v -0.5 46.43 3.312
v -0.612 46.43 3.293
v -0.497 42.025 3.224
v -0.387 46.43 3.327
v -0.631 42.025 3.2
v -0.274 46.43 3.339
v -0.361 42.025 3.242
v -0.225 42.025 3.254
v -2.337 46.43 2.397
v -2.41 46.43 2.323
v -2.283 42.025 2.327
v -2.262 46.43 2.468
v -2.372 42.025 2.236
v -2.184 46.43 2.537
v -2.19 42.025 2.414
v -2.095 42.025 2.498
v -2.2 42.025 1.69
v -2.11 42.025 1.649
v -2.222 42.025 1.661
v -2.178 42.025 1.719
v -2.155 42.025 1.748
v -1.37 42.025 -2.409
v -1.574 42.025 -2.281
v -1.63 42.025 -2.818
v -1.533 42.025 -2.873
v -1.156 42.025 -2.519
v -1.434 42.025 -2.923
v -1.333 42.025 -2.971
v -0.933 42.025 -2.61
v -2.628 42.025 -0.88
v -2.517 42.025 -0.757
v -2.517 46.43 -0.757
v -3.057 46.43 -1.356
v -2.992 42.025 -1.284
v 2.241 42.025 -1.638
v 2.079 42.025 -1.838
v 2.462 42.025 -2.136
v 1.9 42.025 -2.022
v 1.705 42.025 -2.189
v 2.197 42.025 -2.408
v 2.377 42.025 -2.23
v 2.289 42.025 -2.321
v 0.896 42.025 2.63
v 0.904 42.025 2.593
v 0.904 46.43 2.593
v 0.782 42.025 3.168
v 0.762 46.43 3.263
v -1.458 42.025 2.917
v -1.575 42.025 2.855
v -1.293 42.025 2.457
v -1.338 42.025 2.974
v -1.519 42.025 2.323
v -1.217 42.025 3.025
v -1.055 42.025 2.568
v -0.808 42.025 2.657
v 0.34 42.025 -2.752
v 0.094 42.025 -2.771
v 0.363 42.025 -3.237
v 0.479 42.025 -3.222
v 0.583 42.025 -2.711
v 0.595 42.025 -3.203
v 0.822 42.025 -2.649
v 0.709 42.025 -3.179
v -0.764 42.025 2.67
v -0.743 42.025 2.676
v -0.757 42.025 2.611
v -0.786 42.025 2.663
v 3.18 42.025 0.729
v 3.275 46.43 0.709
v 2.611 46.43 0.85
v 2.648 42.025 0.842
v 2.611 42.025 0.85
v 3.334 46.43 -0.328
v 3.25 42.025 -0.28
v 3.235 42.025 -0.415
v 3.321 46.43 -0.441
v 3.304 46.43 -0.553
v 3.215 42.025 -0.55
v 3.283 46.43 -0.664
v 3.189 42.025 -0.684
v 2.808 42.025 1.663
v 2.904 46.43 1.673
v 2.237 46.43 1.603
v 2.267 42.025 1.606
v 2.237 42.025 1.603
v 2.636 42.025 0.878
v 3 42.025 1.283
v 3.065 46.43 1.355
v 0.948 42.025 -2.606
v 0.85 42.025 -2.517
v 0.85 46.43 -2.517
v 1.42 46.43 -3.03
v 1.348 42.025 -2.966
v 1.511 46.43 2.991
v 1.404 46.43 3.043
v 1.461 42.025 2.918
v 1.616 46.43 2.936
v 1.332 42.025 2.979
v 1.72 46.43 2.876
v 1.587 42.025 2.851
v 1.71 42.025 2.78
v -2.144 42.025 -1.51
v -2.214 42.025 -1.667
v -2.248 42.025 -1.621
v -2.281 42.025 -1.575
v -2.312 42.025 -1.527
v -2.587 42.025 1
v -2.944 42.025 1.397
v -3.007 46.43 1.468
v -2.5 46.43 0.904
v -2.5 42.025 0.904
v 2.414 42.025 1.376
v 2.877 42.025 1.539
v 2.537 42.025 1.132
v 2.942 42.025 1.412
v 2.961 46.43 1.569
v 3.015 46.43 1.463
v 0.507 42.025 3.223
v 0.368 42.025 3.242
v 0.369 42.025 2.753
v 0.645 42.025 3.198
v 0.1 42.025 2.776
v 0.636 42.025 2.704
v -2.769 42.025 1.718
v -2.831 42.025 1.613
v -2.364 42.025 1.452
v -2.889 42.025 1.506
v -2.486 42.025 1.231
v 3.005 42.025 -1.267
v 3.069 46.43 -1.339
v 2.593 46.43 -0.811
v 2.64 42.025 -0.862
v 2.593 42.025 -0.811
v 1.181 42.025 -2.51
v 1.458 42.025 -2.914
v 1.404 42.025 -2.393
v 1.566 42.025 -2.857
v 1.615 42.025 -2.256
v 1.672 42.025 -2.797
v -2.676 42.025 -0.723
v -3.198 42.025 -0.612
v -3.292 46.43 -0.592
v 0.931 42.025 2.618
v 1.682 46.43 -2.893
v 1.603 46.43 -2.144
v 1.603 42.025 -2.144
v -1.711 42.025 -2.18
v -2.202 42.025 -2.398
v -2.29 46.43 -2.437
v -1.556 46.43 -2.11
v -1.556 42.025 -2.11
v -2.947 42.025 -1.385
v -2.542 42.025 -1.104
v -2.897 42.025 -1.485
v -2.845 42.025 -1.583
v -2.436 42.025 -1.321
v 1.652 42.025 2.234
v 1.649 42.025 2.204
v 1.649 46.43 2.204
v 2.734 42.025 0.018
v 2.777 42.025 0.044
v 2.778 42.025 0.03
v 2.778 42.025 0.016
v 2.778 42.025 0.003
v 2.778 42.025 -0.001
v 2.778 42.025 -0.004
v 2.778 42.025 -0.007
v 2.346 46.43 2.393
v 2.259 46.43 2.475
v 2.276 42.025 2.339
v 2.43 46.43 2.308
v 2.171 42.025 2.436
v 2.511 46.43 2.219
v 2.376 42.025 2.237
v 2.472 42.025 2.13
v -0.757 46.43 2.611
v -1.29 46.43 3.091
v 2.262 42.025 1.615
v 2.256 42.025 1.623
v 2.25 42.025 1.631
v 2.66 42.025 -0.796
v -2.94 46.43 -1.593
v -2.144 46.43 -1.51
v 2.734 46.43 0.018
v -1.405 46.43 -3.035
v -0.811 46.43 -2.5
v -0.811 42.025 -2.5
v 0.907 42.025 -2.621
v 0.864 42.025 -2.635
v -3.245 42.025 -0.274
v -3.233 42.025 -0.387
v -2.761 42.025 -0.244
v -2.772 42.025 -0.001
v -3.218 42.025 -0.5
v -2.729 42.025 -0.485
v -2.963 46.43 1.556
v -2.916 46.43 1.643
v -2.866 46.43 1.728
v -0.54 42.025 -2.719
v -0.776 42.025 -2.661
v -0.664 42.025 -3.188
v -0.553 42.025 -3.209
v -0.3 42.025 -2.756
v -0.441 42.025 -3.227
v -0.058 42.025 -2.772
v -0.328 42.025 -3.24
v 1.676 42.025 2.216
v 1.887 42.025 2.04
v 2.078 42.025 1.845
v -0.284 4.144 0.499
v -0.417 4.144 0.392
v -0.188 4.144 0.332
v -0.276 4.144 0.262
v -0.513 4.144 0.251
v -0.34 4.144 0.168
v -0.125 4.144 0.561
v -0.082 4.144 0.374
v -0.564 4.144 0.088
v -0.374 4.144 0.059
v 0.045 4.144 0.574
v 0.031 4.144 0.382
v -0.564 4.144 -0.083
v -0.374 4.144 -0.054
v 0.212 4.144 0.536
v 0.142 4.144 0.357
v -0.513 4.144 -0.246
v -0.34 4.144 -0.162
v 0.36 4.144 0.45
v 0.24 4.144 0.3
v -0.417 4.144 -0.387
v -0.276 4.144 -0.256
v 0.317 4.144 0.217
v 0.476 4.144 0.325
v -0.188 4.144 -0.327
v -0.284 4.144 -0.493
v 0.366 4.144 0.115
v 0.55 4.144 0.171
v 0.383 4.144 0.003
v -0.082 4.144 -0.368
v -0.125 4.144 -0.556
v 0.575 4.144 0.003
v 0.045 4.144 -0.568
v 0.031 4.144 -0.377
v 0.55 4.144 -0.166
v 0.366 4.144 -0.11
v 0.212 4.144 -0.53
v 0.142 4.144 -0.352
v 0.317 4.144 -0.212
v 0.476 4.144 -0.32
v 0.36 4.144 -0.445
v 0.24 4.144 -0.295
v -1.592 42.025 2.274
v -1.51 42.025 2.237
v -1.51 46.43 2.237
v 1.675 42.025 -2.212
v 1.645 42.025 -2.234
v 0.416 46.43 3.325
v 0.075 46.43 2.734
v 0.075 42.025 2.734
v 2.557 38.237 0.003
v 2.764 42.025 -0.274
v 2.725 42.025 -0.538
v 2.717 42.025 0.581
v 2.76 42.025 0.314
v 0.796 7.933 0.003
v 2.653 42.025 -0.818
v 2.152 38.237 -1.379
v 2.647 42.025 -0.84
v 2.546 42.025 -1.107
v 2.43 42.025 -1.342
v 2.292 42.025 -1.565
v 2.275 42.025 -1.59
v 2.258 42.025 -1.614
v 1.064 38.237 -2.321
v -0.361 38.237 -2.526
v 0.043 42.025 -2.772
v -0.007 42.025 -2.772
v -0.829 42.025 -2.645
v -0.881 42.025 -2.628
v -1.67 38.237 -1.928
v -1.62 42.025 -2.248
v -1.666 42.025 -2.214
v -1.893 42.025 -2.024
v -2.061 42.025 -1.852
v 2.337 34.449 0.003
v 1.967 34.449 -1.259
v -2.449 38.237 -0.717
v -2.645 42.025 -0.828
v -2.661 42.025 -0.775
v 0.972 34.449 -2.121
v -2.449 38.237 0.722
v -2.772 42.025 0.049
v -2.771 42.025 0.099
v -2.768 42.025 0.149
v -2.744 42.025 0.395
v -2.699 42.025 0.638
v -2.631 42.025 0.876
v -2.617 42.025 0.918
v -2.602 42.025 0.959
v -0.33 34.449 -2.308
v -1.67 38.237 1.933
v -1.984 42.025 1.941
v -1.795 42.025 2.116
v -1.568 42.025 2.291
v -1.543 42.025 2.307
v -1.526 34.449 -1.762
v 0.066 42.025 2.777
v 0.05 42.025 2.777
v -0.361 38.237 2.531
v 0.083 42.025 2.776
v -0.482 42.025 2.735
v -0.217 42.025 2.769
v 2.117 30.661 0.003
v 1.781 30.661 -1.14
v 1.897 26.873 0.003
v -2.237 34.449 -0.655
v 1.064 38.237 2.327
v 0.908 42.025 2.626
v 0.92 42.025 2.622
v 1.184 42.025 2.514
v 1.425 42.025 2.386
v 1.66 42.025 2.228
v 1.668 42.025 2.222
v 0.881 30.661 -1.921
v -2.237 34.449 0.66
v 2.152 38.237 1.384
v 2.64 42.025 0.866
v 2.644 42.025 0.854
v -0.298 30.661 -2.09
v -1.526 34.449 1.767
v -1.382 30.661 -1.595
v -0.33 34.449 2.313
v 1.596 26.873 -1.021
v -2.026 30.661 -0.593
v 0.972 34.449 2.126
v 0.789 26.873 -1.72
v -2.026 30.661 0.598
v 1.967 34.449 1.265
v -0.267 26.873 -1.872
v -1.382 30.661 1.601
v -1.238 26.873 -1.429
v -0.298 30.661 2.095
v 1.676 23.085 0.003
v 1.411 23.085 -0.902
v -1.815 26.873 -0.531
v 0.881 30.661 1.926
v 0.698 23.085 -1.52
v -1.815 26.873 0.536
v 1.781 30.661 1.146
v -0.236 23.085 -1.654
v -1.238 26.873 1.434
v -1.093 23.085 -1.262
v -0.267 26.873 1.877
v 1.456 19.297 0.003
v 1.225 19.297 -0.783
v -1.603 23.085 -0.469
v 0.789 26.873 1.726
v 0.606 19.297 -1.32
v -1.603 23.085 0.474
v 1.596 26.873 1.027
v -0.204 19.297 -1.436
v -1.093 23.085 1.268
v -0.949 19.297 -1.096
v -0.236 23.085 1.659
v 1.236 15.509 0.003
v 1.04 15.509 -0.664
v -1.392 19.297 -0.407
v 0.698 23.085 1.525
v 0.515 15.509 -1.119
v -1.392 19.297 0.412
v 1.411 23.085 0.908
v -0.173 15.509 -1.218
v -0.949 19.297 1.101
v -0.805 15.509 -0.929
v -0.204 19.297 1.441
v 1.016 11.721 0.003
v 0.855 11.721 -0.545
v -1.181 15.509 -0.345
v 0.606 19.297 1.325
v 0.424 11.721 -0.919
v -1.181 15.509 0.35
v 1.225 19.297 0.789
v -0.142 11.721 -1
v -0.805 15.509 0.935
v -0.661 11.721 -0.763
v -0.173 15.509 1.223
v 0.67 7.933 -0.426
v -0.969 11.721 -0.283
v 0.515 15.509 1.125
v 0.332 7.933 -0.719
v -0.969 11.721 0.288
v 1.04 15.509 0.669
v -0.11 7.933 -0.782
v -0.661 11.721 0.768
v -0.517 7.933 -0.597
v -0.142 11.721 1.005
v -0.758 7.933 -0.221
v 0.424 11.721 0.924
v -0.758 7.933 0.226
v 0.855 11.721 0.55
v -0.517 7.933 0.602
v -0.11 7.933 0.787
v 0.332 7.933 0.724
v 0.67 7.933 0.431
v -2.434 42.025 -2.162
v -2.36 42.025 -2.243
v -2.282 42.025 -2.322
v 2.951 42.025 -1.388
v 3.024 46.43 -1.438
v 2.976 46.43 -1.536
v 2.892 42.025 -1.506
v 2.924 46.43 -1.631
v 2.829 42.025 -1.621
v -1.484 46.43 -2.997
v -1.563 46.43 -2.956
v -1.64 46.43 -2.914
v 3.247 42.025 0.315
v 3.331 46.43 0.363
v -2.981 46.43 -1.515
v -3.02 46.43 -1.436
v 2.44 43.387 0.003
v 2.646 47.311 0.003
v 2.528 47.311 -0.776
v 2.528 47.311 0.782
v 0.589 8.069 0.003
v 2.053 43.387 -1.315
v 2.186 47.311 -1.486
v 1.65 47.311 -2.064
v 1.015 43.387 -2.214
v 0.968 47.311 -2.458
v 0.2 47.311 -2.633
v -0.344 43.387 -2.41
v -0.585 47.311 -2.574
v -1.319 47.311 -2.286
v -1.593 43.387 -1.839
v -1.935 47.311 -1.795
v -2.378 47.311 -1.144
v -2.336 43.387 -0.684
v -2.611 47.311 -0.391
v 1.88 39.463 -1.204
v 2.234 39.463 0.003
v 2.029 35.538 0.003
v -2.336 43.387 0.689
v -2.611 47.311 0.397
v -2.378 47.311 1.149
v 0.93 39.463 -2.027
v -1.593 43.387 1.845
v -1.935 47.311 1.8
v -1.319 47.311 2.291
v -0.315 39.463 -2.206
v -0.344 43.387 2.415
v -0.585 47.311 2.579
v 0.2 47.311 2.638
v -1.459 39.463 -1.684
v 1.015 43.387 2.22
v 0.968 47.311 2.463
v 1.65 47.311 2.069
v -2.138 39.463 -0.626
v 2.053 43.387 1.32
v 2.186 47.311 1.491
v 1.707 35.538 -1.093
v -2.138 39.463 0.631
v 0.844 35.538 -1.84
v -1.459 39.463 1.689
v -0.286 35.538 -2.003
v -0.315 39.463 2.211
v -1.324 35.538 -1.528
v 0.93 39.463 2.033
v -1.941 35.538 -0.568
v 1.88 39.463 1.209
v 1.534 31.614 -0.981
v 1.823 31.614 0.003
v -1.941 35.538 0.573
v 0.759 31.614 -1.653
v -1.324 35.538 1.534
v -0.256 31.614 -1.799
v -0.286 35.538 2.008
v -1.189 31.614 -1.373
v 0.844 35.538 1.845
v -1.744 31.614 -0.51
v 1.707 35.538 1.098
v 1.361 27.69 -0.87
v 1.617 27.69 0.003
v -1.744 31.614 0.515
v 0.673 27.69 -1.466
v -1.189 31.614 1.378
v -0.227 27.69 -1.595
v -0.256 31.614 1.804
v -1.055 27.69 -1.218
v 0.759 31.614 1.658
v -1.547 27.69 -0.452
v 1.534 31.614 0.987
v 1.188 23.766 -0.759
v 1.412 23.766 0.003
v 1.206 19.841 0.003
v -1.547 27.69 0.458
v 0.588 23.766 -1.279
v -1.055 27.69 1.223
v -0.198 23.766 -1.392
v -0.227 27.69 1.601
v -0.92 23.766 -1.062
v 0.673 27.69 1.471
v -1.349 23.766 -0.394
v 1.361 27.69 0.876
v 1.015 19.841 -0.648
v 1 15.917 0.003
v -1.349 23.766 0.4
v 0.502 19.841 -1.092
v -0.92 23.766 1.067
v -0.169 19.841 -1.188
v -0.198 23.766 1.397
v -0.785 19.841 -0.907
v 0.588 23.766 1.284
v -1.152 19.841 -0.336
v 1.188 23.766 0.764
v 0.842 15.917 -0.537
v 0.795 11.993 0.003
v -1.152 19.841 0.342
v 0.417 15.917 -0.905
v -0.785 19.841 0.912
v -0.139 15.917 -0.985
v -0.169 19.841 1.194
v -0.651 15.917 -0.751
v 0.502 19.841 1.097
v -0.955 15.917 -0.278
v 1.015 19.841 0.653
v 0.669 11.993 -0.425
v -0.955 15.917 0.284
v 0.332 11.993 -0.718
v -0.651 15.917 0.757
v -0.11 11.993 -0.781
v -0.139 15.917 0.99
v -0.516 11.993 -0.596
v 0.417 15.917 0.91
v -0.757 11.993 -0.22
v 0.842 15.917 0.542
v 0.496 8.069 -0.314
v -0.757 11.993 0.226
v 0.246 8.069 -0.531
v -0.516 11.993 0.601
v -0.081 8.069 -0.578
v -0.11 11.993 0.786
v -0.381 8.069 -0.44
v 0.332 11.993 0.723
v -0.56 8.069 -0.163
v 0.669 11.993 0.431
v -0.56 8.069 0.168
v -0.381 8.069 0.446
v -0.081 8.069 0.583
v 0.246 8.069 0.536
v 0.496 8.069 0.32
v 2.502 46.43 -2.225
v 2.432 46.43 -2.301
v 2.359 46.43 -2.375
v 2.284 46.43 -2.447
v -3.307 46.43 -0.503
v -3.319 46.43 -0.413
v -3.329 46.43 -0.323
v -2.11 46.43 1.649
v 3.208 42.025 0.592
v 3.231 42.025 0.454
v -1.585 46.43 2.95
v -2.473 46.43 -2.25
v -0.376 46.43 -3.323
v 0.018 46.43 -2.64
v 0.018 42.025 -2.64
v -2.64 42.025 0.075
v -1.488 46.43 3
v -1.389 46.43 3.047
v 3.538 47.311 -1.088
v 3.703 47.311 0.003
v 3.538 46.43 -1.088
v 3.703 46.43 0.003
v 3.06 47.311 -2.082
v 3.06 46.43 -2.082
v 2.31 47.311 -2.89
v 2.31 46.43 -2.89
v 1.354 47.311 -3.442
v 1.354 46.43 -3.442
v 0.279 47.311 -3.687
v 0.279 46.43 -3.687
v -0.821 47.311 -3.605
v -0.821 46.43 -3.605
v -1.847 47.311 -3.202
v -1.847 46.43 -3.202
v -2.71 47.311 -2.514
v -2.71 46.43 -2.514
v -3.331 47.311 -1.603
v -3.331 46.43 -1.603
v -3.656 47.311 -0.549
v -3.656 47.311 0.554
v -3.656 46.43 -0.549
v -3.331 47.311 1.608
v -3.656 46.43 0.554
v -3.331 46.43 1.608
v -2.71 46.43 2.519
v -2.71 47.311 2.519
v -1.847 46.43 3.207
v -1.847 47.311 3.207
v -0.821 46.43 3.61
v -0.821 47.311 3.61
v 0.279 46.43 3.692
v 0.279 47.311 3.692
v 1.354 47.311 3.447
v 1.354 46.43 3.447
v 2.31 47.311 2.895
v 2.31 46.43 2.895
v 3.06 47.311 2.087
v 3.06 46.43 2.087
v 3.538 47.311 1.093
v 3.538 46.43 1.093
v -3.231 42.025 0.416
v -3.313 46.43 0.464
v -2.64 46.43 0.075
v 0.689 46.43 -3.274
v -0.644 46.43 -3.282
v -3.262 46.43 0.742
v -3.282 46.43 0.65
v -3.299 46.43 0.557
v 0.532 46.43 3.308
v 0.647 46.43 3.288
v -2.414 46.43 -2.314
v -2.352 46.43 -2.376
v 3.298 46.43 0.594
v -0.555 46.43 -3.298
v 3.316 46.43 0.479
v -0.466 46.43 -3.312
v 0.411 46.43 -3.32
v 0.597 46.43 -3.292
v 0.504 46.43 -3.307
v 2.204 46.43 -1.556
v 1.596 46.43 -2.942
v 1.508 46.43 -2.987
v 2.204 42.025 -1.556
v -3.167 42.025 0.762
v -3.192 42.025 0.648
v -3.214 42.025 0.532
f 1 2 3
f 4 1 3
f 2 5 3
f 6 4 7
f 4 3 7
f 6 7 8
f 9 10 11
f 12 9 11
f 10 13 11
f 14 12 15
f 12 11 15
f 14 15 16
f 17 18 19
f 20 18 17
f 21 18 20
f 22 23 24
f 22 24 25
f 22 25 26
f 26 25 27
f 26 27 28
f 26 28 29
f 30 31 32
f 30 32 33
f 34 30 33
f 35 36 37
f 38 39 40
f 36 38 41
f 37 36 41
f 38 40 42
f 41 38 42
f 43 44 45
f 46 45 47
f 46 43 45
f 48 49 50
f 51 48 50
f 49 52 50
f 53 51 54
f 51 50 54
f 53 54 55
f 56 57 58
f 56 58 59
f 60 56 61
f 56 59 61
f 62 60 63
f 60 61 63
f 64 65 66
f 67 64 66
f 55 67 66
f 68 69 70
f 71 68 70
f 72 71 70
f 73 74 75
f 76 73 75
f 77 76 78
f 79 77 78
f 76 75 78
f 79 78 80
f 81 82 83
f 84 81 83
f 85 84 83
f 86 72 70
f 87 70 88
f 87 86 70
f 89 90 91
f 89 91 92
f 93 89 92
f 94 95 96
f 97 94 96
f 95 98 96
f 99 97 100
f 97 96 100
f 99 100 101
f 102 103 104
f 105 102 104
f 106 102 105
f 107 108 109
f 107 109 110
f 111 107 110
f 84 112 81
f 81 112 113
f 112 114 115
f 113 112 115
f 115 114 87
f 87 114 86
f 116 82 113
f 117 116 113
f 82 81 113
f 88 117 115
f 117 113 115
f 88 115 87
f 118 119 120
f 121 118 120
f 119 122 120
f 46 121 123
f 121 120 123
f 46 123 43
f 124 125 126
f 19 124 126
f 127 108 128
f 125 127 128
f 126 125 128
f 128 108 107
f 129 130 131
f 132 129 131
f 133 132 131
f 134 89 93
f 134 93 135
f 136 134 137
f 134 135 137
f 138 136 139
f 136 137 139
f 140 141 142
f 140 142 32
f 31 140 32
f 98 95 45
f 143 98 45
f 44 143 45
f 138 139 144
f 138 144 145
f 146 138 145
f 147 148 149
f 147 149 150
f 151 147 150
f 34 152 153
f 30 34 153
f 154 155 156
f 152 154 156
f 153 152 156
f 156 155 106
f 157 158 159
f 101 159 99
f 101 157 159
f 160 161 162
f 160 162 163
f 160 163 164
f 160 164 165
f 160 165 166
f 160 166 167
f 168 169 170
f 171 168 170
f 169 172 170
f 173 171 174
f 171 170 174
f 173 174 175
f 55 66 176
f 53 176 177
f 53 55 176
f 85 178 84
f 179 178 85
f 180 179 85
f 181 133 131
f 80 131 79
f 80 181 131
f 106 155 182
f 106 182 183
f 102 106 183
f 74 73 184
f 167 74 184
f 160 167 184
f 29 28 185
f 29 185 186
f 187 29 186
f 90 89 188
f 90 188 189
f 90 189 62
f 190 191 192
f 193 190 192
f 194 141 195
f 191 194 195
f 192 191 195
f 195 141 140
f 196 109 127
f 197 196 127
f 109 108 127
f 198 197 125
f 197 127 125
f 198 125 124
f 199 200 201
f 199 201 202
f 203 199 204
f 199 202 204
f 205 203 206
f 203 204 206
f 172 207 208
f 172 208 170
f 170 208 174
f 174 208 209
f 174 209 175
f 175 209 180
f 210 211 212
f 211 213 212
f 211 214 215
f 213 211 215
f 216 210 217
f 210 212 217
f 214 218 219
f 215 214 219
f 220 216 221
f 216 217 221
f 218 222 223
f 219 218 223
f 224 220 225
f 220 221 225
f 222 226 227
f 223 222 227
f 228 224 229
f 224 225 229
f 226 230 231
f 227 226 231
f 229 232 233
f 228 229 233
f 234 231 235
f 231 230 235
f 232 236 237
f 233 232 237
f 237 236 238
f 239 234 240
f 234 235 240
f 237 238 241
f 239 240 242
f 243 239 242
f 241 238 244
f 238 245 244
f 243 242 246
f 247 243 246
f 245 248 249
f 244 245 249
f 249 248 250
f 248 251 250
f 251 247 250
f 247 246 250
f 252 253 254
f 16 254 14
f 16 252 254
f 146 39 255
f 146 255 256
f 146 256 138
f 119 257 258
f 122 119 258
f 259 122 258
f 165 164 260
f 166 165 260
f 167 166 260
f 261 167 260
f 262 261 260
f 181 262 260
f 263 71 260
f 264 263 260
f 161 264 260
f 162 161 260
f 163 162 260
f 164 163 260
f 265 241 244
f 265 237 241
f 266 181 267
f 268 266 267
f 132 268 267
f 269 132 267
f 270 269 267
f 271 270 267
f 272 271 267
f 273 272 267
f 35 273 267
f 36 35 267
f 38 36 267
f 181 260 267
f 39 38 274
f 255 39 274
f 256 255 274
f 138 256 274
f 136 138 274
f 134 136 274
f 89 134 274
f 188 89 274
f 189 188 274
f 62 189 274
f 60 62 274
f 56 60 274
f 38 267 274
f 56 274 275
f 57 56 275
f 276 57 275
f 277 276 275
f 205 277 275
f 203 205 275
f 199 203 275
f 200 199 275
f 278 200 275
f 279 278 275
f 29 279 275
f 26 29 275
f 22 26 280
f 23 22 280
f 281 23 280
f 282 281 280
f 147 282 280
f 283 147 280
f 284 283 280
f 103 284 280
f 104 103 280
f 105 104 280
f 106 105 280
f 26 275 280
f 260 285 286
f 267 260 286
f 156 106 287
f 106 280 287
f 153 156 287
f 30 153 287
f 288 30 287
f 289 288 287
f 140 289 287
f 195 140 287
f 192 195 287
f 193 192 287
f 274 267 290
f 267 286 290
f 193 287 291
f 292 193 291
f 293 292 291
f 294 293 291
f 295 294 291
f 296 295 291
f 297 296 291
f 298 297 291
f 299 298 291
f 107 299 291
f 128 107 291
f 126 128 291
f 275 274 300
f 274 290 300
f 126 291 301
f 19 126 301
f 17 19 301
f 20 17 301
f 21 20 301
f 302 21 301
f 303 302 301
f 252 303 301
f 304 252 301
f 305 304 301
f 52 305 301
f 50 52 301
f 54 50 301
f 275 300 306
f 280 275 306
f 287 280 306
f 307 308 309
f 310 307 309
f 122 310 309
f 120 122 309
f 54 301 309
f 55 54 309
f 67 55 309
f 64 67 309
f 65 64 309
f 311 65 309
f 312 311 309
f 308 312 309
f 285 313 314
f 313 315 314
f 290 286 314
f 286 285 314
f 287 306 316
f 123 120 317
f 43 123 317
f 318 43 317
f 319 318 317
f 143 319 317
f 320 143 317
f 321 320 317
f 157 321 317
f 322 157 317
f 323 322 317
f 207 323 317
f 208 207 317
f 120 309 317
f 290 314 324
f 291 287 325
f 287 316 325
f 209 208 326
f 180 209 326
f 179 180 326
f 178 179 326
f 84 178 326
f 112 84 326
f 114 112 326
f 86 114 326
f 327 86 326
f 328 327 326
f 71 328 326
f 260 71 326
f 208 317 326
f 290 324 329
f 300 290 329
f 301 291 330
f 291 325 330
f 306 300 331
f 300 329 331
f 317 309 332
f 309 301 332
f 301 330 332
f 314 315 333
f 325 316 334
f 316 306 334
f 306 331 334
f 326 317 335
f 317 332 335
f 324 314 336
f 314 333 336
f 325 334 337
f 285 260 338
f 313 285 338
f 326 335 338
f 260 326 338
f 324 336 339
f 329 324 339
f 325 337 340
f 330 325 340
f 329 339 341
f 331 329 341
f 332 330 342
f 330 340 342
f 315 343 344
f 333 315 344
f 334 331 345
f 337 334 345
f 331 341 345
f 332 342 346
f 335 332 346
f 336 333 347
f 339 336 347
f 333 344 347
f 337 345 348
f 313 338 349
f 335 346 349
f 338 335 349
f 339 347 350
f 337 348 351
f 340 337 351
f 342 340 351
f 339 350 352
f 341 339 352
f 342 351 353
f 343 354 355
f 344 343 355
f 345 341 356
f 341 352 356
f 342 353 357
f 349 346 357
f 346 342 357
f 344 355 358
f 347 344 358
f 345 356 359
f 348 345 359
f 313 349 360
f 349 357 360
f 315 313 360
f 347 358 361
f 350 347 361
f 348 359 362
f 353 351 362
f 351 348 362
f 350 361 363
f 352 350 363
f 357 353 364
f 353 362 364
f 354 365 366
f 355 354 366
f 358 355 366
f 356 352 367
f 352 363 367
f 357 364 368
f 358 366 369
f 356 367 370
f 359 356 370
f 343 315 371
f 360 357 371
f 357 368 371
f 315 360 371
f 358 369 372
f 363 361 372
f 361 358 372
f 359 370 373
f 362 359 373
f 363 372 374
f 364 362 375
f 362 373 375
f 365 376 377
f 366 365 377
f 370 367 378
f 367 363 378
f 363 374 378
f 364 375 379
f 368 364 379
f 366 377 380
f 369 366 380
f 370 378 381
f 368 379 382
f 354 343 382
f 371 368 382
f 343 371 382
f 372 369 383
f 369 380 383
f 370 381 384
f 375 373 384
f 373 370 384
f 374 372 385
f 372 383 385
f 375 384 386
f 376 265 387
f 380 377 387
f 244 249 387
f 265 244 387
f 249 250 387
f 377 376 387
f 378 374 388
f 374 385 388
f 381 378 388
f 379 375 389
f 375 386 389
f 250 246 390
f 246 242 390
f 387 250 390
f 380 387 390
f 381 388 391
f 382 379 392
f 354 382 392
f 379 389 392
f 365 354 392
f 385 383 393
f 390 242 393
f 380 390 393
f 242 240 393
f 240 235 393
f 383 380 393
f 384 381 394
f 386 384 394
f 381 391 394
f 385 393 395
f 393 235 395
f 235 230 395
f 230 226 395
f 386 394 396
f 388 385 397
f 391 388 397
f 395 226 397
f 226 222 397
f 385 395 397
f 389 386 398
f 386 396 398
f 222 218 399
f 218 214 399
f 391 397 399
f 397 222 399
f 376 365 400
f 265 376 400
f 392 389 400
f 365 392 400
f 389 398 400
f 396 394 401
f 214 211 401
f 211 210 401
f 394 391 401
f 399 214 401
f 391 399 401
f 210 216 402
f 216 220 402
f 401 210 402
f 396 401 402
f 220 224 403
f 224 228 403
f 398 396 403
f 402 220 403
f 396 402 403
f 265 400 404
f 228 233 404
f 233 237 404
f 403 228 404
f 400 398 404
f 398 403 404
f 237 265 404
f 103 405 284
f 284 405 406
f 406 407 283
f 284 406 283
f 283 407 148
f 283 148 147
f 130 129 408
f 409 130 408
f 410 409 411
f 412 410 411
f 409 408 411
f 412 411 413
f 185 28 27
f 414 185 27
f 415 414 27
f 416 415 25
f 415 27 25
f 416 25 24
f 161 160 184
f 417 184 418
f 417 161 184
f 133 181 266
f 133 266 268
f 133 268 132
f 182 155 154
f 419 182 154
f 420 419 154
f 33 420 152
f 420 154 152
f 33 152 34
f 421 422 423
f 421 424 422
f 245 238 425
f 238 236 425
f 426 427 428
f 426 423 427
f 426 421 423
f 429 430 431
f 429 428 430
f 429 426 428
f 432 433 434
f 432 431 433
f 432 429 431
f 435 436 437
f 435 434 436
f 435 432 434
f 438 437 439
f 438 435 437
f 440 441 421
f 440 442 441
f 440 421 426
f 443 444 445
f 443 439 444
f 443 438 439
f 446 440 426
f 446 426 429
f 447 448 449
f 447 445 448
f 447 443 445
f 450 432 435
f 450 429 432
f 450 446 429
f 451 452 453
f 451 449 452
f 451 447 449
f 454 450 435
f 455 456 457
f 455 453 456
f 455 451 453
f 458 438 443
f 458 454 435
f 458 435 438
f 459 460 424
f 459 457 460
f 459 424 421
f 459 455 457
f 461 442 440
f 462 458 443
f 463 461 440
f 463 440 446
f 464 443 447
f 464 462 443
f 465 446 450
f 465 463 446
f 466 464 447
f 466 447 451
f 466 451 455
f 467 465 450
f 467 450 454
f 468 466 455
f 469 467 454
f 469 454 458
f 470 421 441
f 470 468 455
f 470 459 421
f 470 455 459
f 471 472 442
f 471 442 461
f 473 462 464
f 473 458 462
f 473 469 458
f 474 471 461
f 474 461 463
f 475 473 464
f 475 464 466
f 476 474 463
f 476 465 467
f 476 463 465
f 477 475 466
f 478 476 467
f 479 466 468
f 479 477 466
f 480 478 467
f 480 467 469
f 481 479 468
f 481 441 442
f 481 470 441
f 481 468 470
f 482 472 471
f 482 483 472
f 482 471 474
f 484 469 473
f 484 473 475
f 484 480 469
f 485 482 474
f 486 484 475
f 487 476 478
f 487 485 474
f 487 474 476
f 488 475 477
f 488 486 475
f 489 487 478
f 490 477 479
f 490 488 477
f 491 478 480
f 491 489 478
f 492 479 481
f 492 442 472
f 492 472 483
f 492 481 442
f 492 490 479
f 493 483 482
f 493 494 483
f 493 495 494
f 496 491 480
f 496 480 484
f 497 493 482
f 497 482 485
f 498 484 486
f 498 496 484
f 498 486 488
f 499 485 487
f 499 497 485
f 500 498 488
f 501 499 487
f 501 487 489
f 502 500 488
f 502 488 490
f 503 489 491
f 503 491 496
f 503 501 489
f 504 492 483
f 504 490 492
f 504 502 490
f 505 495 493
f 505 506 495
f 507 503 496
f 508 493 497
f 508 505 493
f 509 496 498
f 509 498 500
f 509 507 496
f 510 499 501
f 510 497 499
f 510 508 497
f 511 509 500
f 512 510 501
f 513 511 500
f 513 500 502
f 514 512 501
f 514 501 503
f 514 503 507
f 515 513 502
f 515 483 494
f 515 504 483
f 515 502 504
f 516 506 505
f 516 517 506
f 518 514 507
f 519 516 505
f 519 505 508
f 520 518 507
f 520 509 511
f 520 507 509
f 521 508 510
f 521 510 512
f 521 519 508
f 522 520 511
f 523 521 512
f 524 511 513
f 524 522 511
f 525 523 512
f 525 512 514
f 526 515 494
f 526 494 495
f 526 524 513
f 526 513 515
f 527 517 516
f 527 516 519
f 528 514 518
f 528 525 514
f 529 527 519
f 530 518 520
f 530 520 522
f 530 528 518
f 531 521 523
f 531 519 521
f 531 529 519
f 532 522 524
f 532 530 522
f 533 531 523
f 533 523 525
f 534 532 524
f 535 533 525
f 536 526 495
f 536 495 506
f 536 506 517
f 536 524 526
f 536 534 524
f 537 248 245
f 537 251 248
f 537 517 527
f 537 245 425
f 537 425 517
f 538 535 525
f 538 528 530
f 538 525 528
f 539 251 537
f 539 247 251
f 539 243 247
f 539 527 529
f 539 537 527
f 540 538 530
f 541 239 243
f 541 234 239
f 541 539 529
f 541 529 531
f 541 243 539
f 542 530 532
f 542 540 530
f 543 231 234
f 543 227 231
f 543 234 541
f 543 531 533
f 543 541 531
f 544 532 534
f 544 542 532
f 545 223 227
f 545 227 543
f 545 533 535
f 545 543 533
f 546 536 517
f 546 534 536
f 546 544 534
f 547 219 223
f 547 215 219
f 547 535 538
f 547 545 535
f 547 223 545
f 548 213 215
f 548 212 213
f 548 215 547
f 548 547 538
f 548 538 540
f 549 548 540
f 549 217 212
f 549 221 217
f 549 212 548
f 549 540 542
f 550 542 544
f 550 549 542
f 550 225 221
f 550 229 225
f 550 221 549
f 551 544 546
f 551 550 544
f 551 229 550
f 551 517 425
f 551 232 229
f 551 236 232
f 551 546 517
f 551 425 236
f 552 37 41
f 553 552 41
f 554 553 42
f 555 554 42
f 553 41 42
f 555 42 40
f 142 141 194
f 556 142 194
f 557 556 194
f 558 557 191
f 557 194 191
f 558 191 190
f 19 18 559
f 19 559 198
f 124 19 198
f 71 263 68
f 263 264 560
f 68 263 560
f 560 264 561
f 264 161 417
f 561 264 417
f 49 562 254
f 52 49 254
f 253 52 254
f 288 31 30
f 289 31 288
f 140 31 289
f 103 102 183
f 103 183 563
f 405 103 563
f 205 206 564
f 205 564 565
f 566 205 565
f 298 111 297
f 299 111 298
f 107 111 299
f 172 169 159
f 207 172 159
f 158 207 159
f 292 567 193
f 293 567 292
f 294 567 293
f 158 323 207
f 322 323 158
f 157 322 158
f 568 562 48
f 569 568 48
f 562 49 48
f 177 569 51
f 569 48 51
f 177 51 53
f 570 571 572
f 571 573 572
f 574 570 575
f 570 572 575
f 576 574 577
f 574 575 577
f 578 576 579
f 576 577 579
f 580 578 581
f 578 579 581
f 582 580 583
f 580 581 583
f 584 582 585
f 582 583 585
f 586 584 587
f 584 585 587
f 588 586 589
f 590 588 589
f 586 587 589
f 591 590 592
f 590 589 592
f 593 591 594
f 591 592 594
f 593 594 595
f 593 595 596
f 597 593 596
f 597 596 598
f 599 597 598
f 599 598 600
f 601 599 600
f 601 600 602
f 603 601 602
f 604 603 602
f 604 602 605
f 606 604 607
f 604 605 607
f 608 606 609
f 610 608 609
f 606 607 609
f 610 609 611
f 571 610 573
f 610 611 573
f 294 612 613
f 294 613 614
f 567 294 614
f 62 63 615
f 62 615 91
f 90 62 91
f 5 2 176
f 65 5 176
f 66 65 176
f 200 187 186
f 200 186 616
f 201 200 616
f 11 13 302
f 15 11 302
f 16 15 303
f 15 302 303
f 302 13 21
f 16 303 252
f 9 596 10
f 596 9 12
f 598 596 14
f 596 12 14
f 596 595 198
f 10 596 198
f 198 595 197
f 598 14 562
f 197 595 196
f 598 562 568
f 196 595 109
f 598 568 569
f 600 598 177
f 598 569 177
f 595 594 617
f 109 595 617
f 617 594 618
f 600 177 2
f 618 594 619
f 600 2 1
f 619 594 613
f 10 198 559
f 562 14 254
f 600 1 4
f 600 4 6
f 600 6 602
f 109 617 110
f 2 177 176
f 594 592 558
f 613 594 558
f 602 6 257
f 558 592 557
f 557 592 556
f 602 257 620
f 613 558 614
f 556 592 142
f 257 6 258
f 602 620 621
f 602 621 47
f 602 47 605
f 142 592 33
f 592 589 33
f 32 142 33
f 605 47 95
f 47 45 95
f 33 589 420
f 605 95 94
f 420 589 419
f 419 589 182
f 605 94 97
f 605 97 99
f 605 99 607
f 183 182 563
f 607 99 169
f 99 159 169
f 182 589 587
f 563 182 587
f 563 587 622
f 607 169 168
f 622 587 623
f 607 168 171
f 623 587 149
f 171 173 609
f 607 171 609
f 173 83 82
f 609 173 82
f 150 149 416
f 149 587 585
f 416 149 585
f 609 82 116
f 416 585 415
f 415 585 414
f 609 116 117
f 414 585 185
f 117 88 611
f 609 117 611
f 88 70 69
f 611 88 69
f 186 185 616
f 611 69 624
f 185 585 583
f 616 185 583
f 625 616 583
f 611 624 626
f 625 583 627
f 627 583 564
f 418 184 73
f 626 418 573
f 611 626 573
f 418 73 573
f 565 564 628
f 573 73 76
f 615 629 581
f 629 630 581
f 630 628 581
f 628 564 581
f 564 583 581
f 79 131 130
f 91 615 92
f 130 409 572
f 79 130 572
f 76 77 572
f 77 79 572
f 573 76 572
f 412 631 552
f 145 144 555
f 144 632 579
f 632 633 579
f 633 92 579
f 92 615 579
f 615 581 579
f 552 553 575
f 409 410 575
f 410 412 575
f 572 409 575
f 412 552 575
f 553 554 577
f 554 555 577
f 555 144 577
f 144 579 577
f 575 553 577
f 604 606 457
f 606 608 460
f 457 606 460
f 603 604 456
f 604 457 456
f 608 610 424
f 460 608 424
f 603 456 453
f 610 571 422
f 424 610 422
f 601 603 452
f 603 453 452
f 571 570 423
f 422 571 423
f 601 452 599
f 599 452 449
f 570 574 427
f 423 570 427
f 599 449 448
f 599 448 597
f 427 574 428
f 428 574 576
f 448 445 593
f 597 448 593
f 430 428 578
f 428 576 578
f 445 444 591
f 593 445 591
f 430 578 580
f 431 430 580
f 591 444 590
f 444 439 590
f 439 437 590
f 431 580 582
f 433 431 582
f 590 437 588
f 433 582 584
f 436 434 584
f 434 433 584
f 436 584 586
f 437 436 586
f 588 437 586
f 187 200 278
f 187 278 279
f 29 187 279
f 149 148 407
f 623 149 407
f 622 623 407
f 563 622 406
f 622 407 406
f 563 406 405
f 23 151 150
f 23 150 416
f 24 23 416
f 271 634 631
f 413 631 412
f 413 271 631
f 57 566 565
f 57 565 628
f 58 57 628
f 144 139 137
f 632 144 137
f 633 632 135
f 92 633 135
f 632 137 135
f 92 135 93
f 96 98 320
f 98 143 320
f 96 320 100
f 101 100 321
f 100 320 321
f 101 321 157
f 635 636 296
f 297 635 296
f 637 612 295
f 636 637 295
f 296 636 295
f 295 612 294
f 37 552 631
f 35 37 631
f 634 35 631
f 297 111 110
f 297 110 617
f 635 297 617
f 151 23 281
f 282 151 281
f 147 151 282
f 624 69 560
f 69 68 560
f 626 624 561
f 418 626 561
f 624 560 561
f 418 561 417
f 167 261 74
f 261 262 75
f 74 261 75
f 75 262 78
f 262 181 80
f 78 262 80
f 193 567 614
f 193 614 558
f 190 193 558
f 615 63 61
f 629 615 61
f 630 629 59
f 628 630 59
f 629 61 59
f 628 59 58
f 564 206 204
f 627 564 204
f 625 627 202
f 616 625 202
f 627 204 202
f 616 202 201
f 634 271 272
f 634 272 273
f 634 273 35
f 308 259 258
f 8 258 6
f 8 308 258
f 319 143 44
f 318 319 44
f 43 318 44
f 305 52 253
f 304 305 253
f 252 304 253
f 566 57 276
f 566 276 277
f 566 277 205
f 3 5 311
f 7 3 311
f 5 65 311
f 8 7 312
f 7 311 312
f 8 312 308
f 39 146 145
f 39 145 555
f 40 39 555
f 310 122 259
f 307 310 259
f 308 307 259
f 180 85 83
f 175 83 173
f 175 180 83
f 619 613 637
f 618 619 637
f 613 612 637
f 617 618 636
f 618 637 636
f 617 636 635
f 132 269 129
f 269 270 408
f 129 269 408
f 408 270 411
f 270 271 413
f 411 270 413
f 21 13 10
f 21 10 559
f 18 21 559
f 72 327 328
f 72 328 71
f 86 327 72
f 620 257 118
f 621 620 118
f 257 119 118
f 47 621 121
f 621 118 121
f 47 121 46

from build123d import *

# Parameters (mm, degrees)
IZIM2_R               = 3
KES_EKSTR_ZYON1_DEPTH = 49
KES_EKSTR_ZYON1_TAPER = 3
KES_EKSTR_ZYON4_DEPTH = 5
SCALE1_SCALE          = 0.880952381


with BuildPart() as part:
    # Çizim1 → Döndür1 (revolve)
    with BuildSketch(Plane.XY):
        Polygon((0, 0), (0, 49), (4.2, 49), (4.2, 48), (3.8, 48), (3.7, 43), (3.15, 43), (0.65, 0), align=None)
    revolve(axis=Axis((0, 0, 0), (0, 1, 0)))

    # Çizim2 → Kes-Ekstrüzyon1 (cut)
    with BuildSketch(Plane(origin=(0, 49, 0), x_dir=(1, 0, 0), z_dir=(0, 1, 0))):
        Circle(IZIM2_R)
    extrude(amount=-KES_EKSTR_ZYON1_DEPTH, taper=KES_EKSTR_ZYON1_TAPER, mode=Mode.SUBTRACT)

    # Çizim3 → Kes-Ekstrüzyon4 (cut)
    with BuildSketch(Plane.XZ.offset(-43)):
        Polygon((0.08224501, 3.1), (-0.41775499, 3.966025404), (0.58224501, 3.966025404), align=None)
        Polygon((0.815256969, 3.918905719), (1.766313485, 3.609888725), (1.02316866, 2.940758119), align=None)
        Polygon((1.973360244, 3.493070587), (2.782377238, 2.905285335), (1.868831781, 2.498548692), align=None)
        Polygon((2.943191617, 2.730203716), (3.53097687, 1.921186722), (2.536454974, 1.816658258), align=None)
        Polygon((3.629817237, 1.704979831), (3.938834232, 0.753923315), (2.960686631, 0.961835006), align=None)
        Polygon((3.966025404, 0.51775499), (3.966025404, -0.48224501), (3.1, 0.01775499), align=None)
        Polygon((3.918905719, -0.715256969), (3.609888725, -1.666313485), (2.940758119, -0.92316866), align=None)
        Polygon((3.493070587, -1.873360244), (2.905285335, -2.682377238), (2.498548692, -1.768831781), align=None)
        Polygon((2.730203716, -2.843191617), (1.921186722, -3.43097687), (1.816658258, -2.436454974), align=None)
        Polygon((1.704979831, -3.529817237), (0.753923315, -3.838834232), (0.961835006, -2.860686631), align=None)
        Polygon((0.51775499, -3.866025404), (-0.48224501, -3.866025404), (0.01775499, -3), align=None)
        Polygon((-0.715256969, -3.818905719), (-1.666313485, -3.509888725), (-0.92316866, -2.840758119), align=None)
        Polygon((-1.873360244, -3.393070587), (-2.682377238, -2.805285335), (-1.768831781, -2.398548692), align=None)
        Polygon((-2.843191617, -2.630203716), (-3.43097687, -1.821186722), (-2.436454974, -1.716658258), align=None)
        Polygon((-3.529817237, -1.604979831), (-3.838834232, -0.653923315), (-2.860686631, -0.861835006), align=None)
        Polygon((-3.866025404, -0.41775499), (-3.866025404, 0.58224501), (-3, 0.08224501), align=None)
        Polygon((-3.818905719, 0.815256969), (-3.509888725, 1.766313485), (-2.840758119, 1.02316866), align=None)
        Polygon((-3.393070587, 1.973360244), (-2.805285335, 2.782377238), (-2.398548692, 1.868831781), align=None)
        Polygon((-2.630203716, 2.943191617), (-1.821186722, 3.53097687), (-1.716658258, 2.536454974), align=None)
        Polygon((-1.604979831, 3.629817237), (-0.653923315, 3.938834232), (-0.861835006, 2.960686631), align=None)
    extrude(amount=-KES_EKSTR_ZYON4_DEPTH, mode=Mode.SUBTRACT)


with BuildPart() as part_1:
    # Scale1: scaled about (0.02225364, 34.813303108, 0.02225364)
    add(part.part.scale(SCALE1_SCALE).moved(Location((0.002649243, 4.144440846, 0.002649243))))


solid = part_1.part
